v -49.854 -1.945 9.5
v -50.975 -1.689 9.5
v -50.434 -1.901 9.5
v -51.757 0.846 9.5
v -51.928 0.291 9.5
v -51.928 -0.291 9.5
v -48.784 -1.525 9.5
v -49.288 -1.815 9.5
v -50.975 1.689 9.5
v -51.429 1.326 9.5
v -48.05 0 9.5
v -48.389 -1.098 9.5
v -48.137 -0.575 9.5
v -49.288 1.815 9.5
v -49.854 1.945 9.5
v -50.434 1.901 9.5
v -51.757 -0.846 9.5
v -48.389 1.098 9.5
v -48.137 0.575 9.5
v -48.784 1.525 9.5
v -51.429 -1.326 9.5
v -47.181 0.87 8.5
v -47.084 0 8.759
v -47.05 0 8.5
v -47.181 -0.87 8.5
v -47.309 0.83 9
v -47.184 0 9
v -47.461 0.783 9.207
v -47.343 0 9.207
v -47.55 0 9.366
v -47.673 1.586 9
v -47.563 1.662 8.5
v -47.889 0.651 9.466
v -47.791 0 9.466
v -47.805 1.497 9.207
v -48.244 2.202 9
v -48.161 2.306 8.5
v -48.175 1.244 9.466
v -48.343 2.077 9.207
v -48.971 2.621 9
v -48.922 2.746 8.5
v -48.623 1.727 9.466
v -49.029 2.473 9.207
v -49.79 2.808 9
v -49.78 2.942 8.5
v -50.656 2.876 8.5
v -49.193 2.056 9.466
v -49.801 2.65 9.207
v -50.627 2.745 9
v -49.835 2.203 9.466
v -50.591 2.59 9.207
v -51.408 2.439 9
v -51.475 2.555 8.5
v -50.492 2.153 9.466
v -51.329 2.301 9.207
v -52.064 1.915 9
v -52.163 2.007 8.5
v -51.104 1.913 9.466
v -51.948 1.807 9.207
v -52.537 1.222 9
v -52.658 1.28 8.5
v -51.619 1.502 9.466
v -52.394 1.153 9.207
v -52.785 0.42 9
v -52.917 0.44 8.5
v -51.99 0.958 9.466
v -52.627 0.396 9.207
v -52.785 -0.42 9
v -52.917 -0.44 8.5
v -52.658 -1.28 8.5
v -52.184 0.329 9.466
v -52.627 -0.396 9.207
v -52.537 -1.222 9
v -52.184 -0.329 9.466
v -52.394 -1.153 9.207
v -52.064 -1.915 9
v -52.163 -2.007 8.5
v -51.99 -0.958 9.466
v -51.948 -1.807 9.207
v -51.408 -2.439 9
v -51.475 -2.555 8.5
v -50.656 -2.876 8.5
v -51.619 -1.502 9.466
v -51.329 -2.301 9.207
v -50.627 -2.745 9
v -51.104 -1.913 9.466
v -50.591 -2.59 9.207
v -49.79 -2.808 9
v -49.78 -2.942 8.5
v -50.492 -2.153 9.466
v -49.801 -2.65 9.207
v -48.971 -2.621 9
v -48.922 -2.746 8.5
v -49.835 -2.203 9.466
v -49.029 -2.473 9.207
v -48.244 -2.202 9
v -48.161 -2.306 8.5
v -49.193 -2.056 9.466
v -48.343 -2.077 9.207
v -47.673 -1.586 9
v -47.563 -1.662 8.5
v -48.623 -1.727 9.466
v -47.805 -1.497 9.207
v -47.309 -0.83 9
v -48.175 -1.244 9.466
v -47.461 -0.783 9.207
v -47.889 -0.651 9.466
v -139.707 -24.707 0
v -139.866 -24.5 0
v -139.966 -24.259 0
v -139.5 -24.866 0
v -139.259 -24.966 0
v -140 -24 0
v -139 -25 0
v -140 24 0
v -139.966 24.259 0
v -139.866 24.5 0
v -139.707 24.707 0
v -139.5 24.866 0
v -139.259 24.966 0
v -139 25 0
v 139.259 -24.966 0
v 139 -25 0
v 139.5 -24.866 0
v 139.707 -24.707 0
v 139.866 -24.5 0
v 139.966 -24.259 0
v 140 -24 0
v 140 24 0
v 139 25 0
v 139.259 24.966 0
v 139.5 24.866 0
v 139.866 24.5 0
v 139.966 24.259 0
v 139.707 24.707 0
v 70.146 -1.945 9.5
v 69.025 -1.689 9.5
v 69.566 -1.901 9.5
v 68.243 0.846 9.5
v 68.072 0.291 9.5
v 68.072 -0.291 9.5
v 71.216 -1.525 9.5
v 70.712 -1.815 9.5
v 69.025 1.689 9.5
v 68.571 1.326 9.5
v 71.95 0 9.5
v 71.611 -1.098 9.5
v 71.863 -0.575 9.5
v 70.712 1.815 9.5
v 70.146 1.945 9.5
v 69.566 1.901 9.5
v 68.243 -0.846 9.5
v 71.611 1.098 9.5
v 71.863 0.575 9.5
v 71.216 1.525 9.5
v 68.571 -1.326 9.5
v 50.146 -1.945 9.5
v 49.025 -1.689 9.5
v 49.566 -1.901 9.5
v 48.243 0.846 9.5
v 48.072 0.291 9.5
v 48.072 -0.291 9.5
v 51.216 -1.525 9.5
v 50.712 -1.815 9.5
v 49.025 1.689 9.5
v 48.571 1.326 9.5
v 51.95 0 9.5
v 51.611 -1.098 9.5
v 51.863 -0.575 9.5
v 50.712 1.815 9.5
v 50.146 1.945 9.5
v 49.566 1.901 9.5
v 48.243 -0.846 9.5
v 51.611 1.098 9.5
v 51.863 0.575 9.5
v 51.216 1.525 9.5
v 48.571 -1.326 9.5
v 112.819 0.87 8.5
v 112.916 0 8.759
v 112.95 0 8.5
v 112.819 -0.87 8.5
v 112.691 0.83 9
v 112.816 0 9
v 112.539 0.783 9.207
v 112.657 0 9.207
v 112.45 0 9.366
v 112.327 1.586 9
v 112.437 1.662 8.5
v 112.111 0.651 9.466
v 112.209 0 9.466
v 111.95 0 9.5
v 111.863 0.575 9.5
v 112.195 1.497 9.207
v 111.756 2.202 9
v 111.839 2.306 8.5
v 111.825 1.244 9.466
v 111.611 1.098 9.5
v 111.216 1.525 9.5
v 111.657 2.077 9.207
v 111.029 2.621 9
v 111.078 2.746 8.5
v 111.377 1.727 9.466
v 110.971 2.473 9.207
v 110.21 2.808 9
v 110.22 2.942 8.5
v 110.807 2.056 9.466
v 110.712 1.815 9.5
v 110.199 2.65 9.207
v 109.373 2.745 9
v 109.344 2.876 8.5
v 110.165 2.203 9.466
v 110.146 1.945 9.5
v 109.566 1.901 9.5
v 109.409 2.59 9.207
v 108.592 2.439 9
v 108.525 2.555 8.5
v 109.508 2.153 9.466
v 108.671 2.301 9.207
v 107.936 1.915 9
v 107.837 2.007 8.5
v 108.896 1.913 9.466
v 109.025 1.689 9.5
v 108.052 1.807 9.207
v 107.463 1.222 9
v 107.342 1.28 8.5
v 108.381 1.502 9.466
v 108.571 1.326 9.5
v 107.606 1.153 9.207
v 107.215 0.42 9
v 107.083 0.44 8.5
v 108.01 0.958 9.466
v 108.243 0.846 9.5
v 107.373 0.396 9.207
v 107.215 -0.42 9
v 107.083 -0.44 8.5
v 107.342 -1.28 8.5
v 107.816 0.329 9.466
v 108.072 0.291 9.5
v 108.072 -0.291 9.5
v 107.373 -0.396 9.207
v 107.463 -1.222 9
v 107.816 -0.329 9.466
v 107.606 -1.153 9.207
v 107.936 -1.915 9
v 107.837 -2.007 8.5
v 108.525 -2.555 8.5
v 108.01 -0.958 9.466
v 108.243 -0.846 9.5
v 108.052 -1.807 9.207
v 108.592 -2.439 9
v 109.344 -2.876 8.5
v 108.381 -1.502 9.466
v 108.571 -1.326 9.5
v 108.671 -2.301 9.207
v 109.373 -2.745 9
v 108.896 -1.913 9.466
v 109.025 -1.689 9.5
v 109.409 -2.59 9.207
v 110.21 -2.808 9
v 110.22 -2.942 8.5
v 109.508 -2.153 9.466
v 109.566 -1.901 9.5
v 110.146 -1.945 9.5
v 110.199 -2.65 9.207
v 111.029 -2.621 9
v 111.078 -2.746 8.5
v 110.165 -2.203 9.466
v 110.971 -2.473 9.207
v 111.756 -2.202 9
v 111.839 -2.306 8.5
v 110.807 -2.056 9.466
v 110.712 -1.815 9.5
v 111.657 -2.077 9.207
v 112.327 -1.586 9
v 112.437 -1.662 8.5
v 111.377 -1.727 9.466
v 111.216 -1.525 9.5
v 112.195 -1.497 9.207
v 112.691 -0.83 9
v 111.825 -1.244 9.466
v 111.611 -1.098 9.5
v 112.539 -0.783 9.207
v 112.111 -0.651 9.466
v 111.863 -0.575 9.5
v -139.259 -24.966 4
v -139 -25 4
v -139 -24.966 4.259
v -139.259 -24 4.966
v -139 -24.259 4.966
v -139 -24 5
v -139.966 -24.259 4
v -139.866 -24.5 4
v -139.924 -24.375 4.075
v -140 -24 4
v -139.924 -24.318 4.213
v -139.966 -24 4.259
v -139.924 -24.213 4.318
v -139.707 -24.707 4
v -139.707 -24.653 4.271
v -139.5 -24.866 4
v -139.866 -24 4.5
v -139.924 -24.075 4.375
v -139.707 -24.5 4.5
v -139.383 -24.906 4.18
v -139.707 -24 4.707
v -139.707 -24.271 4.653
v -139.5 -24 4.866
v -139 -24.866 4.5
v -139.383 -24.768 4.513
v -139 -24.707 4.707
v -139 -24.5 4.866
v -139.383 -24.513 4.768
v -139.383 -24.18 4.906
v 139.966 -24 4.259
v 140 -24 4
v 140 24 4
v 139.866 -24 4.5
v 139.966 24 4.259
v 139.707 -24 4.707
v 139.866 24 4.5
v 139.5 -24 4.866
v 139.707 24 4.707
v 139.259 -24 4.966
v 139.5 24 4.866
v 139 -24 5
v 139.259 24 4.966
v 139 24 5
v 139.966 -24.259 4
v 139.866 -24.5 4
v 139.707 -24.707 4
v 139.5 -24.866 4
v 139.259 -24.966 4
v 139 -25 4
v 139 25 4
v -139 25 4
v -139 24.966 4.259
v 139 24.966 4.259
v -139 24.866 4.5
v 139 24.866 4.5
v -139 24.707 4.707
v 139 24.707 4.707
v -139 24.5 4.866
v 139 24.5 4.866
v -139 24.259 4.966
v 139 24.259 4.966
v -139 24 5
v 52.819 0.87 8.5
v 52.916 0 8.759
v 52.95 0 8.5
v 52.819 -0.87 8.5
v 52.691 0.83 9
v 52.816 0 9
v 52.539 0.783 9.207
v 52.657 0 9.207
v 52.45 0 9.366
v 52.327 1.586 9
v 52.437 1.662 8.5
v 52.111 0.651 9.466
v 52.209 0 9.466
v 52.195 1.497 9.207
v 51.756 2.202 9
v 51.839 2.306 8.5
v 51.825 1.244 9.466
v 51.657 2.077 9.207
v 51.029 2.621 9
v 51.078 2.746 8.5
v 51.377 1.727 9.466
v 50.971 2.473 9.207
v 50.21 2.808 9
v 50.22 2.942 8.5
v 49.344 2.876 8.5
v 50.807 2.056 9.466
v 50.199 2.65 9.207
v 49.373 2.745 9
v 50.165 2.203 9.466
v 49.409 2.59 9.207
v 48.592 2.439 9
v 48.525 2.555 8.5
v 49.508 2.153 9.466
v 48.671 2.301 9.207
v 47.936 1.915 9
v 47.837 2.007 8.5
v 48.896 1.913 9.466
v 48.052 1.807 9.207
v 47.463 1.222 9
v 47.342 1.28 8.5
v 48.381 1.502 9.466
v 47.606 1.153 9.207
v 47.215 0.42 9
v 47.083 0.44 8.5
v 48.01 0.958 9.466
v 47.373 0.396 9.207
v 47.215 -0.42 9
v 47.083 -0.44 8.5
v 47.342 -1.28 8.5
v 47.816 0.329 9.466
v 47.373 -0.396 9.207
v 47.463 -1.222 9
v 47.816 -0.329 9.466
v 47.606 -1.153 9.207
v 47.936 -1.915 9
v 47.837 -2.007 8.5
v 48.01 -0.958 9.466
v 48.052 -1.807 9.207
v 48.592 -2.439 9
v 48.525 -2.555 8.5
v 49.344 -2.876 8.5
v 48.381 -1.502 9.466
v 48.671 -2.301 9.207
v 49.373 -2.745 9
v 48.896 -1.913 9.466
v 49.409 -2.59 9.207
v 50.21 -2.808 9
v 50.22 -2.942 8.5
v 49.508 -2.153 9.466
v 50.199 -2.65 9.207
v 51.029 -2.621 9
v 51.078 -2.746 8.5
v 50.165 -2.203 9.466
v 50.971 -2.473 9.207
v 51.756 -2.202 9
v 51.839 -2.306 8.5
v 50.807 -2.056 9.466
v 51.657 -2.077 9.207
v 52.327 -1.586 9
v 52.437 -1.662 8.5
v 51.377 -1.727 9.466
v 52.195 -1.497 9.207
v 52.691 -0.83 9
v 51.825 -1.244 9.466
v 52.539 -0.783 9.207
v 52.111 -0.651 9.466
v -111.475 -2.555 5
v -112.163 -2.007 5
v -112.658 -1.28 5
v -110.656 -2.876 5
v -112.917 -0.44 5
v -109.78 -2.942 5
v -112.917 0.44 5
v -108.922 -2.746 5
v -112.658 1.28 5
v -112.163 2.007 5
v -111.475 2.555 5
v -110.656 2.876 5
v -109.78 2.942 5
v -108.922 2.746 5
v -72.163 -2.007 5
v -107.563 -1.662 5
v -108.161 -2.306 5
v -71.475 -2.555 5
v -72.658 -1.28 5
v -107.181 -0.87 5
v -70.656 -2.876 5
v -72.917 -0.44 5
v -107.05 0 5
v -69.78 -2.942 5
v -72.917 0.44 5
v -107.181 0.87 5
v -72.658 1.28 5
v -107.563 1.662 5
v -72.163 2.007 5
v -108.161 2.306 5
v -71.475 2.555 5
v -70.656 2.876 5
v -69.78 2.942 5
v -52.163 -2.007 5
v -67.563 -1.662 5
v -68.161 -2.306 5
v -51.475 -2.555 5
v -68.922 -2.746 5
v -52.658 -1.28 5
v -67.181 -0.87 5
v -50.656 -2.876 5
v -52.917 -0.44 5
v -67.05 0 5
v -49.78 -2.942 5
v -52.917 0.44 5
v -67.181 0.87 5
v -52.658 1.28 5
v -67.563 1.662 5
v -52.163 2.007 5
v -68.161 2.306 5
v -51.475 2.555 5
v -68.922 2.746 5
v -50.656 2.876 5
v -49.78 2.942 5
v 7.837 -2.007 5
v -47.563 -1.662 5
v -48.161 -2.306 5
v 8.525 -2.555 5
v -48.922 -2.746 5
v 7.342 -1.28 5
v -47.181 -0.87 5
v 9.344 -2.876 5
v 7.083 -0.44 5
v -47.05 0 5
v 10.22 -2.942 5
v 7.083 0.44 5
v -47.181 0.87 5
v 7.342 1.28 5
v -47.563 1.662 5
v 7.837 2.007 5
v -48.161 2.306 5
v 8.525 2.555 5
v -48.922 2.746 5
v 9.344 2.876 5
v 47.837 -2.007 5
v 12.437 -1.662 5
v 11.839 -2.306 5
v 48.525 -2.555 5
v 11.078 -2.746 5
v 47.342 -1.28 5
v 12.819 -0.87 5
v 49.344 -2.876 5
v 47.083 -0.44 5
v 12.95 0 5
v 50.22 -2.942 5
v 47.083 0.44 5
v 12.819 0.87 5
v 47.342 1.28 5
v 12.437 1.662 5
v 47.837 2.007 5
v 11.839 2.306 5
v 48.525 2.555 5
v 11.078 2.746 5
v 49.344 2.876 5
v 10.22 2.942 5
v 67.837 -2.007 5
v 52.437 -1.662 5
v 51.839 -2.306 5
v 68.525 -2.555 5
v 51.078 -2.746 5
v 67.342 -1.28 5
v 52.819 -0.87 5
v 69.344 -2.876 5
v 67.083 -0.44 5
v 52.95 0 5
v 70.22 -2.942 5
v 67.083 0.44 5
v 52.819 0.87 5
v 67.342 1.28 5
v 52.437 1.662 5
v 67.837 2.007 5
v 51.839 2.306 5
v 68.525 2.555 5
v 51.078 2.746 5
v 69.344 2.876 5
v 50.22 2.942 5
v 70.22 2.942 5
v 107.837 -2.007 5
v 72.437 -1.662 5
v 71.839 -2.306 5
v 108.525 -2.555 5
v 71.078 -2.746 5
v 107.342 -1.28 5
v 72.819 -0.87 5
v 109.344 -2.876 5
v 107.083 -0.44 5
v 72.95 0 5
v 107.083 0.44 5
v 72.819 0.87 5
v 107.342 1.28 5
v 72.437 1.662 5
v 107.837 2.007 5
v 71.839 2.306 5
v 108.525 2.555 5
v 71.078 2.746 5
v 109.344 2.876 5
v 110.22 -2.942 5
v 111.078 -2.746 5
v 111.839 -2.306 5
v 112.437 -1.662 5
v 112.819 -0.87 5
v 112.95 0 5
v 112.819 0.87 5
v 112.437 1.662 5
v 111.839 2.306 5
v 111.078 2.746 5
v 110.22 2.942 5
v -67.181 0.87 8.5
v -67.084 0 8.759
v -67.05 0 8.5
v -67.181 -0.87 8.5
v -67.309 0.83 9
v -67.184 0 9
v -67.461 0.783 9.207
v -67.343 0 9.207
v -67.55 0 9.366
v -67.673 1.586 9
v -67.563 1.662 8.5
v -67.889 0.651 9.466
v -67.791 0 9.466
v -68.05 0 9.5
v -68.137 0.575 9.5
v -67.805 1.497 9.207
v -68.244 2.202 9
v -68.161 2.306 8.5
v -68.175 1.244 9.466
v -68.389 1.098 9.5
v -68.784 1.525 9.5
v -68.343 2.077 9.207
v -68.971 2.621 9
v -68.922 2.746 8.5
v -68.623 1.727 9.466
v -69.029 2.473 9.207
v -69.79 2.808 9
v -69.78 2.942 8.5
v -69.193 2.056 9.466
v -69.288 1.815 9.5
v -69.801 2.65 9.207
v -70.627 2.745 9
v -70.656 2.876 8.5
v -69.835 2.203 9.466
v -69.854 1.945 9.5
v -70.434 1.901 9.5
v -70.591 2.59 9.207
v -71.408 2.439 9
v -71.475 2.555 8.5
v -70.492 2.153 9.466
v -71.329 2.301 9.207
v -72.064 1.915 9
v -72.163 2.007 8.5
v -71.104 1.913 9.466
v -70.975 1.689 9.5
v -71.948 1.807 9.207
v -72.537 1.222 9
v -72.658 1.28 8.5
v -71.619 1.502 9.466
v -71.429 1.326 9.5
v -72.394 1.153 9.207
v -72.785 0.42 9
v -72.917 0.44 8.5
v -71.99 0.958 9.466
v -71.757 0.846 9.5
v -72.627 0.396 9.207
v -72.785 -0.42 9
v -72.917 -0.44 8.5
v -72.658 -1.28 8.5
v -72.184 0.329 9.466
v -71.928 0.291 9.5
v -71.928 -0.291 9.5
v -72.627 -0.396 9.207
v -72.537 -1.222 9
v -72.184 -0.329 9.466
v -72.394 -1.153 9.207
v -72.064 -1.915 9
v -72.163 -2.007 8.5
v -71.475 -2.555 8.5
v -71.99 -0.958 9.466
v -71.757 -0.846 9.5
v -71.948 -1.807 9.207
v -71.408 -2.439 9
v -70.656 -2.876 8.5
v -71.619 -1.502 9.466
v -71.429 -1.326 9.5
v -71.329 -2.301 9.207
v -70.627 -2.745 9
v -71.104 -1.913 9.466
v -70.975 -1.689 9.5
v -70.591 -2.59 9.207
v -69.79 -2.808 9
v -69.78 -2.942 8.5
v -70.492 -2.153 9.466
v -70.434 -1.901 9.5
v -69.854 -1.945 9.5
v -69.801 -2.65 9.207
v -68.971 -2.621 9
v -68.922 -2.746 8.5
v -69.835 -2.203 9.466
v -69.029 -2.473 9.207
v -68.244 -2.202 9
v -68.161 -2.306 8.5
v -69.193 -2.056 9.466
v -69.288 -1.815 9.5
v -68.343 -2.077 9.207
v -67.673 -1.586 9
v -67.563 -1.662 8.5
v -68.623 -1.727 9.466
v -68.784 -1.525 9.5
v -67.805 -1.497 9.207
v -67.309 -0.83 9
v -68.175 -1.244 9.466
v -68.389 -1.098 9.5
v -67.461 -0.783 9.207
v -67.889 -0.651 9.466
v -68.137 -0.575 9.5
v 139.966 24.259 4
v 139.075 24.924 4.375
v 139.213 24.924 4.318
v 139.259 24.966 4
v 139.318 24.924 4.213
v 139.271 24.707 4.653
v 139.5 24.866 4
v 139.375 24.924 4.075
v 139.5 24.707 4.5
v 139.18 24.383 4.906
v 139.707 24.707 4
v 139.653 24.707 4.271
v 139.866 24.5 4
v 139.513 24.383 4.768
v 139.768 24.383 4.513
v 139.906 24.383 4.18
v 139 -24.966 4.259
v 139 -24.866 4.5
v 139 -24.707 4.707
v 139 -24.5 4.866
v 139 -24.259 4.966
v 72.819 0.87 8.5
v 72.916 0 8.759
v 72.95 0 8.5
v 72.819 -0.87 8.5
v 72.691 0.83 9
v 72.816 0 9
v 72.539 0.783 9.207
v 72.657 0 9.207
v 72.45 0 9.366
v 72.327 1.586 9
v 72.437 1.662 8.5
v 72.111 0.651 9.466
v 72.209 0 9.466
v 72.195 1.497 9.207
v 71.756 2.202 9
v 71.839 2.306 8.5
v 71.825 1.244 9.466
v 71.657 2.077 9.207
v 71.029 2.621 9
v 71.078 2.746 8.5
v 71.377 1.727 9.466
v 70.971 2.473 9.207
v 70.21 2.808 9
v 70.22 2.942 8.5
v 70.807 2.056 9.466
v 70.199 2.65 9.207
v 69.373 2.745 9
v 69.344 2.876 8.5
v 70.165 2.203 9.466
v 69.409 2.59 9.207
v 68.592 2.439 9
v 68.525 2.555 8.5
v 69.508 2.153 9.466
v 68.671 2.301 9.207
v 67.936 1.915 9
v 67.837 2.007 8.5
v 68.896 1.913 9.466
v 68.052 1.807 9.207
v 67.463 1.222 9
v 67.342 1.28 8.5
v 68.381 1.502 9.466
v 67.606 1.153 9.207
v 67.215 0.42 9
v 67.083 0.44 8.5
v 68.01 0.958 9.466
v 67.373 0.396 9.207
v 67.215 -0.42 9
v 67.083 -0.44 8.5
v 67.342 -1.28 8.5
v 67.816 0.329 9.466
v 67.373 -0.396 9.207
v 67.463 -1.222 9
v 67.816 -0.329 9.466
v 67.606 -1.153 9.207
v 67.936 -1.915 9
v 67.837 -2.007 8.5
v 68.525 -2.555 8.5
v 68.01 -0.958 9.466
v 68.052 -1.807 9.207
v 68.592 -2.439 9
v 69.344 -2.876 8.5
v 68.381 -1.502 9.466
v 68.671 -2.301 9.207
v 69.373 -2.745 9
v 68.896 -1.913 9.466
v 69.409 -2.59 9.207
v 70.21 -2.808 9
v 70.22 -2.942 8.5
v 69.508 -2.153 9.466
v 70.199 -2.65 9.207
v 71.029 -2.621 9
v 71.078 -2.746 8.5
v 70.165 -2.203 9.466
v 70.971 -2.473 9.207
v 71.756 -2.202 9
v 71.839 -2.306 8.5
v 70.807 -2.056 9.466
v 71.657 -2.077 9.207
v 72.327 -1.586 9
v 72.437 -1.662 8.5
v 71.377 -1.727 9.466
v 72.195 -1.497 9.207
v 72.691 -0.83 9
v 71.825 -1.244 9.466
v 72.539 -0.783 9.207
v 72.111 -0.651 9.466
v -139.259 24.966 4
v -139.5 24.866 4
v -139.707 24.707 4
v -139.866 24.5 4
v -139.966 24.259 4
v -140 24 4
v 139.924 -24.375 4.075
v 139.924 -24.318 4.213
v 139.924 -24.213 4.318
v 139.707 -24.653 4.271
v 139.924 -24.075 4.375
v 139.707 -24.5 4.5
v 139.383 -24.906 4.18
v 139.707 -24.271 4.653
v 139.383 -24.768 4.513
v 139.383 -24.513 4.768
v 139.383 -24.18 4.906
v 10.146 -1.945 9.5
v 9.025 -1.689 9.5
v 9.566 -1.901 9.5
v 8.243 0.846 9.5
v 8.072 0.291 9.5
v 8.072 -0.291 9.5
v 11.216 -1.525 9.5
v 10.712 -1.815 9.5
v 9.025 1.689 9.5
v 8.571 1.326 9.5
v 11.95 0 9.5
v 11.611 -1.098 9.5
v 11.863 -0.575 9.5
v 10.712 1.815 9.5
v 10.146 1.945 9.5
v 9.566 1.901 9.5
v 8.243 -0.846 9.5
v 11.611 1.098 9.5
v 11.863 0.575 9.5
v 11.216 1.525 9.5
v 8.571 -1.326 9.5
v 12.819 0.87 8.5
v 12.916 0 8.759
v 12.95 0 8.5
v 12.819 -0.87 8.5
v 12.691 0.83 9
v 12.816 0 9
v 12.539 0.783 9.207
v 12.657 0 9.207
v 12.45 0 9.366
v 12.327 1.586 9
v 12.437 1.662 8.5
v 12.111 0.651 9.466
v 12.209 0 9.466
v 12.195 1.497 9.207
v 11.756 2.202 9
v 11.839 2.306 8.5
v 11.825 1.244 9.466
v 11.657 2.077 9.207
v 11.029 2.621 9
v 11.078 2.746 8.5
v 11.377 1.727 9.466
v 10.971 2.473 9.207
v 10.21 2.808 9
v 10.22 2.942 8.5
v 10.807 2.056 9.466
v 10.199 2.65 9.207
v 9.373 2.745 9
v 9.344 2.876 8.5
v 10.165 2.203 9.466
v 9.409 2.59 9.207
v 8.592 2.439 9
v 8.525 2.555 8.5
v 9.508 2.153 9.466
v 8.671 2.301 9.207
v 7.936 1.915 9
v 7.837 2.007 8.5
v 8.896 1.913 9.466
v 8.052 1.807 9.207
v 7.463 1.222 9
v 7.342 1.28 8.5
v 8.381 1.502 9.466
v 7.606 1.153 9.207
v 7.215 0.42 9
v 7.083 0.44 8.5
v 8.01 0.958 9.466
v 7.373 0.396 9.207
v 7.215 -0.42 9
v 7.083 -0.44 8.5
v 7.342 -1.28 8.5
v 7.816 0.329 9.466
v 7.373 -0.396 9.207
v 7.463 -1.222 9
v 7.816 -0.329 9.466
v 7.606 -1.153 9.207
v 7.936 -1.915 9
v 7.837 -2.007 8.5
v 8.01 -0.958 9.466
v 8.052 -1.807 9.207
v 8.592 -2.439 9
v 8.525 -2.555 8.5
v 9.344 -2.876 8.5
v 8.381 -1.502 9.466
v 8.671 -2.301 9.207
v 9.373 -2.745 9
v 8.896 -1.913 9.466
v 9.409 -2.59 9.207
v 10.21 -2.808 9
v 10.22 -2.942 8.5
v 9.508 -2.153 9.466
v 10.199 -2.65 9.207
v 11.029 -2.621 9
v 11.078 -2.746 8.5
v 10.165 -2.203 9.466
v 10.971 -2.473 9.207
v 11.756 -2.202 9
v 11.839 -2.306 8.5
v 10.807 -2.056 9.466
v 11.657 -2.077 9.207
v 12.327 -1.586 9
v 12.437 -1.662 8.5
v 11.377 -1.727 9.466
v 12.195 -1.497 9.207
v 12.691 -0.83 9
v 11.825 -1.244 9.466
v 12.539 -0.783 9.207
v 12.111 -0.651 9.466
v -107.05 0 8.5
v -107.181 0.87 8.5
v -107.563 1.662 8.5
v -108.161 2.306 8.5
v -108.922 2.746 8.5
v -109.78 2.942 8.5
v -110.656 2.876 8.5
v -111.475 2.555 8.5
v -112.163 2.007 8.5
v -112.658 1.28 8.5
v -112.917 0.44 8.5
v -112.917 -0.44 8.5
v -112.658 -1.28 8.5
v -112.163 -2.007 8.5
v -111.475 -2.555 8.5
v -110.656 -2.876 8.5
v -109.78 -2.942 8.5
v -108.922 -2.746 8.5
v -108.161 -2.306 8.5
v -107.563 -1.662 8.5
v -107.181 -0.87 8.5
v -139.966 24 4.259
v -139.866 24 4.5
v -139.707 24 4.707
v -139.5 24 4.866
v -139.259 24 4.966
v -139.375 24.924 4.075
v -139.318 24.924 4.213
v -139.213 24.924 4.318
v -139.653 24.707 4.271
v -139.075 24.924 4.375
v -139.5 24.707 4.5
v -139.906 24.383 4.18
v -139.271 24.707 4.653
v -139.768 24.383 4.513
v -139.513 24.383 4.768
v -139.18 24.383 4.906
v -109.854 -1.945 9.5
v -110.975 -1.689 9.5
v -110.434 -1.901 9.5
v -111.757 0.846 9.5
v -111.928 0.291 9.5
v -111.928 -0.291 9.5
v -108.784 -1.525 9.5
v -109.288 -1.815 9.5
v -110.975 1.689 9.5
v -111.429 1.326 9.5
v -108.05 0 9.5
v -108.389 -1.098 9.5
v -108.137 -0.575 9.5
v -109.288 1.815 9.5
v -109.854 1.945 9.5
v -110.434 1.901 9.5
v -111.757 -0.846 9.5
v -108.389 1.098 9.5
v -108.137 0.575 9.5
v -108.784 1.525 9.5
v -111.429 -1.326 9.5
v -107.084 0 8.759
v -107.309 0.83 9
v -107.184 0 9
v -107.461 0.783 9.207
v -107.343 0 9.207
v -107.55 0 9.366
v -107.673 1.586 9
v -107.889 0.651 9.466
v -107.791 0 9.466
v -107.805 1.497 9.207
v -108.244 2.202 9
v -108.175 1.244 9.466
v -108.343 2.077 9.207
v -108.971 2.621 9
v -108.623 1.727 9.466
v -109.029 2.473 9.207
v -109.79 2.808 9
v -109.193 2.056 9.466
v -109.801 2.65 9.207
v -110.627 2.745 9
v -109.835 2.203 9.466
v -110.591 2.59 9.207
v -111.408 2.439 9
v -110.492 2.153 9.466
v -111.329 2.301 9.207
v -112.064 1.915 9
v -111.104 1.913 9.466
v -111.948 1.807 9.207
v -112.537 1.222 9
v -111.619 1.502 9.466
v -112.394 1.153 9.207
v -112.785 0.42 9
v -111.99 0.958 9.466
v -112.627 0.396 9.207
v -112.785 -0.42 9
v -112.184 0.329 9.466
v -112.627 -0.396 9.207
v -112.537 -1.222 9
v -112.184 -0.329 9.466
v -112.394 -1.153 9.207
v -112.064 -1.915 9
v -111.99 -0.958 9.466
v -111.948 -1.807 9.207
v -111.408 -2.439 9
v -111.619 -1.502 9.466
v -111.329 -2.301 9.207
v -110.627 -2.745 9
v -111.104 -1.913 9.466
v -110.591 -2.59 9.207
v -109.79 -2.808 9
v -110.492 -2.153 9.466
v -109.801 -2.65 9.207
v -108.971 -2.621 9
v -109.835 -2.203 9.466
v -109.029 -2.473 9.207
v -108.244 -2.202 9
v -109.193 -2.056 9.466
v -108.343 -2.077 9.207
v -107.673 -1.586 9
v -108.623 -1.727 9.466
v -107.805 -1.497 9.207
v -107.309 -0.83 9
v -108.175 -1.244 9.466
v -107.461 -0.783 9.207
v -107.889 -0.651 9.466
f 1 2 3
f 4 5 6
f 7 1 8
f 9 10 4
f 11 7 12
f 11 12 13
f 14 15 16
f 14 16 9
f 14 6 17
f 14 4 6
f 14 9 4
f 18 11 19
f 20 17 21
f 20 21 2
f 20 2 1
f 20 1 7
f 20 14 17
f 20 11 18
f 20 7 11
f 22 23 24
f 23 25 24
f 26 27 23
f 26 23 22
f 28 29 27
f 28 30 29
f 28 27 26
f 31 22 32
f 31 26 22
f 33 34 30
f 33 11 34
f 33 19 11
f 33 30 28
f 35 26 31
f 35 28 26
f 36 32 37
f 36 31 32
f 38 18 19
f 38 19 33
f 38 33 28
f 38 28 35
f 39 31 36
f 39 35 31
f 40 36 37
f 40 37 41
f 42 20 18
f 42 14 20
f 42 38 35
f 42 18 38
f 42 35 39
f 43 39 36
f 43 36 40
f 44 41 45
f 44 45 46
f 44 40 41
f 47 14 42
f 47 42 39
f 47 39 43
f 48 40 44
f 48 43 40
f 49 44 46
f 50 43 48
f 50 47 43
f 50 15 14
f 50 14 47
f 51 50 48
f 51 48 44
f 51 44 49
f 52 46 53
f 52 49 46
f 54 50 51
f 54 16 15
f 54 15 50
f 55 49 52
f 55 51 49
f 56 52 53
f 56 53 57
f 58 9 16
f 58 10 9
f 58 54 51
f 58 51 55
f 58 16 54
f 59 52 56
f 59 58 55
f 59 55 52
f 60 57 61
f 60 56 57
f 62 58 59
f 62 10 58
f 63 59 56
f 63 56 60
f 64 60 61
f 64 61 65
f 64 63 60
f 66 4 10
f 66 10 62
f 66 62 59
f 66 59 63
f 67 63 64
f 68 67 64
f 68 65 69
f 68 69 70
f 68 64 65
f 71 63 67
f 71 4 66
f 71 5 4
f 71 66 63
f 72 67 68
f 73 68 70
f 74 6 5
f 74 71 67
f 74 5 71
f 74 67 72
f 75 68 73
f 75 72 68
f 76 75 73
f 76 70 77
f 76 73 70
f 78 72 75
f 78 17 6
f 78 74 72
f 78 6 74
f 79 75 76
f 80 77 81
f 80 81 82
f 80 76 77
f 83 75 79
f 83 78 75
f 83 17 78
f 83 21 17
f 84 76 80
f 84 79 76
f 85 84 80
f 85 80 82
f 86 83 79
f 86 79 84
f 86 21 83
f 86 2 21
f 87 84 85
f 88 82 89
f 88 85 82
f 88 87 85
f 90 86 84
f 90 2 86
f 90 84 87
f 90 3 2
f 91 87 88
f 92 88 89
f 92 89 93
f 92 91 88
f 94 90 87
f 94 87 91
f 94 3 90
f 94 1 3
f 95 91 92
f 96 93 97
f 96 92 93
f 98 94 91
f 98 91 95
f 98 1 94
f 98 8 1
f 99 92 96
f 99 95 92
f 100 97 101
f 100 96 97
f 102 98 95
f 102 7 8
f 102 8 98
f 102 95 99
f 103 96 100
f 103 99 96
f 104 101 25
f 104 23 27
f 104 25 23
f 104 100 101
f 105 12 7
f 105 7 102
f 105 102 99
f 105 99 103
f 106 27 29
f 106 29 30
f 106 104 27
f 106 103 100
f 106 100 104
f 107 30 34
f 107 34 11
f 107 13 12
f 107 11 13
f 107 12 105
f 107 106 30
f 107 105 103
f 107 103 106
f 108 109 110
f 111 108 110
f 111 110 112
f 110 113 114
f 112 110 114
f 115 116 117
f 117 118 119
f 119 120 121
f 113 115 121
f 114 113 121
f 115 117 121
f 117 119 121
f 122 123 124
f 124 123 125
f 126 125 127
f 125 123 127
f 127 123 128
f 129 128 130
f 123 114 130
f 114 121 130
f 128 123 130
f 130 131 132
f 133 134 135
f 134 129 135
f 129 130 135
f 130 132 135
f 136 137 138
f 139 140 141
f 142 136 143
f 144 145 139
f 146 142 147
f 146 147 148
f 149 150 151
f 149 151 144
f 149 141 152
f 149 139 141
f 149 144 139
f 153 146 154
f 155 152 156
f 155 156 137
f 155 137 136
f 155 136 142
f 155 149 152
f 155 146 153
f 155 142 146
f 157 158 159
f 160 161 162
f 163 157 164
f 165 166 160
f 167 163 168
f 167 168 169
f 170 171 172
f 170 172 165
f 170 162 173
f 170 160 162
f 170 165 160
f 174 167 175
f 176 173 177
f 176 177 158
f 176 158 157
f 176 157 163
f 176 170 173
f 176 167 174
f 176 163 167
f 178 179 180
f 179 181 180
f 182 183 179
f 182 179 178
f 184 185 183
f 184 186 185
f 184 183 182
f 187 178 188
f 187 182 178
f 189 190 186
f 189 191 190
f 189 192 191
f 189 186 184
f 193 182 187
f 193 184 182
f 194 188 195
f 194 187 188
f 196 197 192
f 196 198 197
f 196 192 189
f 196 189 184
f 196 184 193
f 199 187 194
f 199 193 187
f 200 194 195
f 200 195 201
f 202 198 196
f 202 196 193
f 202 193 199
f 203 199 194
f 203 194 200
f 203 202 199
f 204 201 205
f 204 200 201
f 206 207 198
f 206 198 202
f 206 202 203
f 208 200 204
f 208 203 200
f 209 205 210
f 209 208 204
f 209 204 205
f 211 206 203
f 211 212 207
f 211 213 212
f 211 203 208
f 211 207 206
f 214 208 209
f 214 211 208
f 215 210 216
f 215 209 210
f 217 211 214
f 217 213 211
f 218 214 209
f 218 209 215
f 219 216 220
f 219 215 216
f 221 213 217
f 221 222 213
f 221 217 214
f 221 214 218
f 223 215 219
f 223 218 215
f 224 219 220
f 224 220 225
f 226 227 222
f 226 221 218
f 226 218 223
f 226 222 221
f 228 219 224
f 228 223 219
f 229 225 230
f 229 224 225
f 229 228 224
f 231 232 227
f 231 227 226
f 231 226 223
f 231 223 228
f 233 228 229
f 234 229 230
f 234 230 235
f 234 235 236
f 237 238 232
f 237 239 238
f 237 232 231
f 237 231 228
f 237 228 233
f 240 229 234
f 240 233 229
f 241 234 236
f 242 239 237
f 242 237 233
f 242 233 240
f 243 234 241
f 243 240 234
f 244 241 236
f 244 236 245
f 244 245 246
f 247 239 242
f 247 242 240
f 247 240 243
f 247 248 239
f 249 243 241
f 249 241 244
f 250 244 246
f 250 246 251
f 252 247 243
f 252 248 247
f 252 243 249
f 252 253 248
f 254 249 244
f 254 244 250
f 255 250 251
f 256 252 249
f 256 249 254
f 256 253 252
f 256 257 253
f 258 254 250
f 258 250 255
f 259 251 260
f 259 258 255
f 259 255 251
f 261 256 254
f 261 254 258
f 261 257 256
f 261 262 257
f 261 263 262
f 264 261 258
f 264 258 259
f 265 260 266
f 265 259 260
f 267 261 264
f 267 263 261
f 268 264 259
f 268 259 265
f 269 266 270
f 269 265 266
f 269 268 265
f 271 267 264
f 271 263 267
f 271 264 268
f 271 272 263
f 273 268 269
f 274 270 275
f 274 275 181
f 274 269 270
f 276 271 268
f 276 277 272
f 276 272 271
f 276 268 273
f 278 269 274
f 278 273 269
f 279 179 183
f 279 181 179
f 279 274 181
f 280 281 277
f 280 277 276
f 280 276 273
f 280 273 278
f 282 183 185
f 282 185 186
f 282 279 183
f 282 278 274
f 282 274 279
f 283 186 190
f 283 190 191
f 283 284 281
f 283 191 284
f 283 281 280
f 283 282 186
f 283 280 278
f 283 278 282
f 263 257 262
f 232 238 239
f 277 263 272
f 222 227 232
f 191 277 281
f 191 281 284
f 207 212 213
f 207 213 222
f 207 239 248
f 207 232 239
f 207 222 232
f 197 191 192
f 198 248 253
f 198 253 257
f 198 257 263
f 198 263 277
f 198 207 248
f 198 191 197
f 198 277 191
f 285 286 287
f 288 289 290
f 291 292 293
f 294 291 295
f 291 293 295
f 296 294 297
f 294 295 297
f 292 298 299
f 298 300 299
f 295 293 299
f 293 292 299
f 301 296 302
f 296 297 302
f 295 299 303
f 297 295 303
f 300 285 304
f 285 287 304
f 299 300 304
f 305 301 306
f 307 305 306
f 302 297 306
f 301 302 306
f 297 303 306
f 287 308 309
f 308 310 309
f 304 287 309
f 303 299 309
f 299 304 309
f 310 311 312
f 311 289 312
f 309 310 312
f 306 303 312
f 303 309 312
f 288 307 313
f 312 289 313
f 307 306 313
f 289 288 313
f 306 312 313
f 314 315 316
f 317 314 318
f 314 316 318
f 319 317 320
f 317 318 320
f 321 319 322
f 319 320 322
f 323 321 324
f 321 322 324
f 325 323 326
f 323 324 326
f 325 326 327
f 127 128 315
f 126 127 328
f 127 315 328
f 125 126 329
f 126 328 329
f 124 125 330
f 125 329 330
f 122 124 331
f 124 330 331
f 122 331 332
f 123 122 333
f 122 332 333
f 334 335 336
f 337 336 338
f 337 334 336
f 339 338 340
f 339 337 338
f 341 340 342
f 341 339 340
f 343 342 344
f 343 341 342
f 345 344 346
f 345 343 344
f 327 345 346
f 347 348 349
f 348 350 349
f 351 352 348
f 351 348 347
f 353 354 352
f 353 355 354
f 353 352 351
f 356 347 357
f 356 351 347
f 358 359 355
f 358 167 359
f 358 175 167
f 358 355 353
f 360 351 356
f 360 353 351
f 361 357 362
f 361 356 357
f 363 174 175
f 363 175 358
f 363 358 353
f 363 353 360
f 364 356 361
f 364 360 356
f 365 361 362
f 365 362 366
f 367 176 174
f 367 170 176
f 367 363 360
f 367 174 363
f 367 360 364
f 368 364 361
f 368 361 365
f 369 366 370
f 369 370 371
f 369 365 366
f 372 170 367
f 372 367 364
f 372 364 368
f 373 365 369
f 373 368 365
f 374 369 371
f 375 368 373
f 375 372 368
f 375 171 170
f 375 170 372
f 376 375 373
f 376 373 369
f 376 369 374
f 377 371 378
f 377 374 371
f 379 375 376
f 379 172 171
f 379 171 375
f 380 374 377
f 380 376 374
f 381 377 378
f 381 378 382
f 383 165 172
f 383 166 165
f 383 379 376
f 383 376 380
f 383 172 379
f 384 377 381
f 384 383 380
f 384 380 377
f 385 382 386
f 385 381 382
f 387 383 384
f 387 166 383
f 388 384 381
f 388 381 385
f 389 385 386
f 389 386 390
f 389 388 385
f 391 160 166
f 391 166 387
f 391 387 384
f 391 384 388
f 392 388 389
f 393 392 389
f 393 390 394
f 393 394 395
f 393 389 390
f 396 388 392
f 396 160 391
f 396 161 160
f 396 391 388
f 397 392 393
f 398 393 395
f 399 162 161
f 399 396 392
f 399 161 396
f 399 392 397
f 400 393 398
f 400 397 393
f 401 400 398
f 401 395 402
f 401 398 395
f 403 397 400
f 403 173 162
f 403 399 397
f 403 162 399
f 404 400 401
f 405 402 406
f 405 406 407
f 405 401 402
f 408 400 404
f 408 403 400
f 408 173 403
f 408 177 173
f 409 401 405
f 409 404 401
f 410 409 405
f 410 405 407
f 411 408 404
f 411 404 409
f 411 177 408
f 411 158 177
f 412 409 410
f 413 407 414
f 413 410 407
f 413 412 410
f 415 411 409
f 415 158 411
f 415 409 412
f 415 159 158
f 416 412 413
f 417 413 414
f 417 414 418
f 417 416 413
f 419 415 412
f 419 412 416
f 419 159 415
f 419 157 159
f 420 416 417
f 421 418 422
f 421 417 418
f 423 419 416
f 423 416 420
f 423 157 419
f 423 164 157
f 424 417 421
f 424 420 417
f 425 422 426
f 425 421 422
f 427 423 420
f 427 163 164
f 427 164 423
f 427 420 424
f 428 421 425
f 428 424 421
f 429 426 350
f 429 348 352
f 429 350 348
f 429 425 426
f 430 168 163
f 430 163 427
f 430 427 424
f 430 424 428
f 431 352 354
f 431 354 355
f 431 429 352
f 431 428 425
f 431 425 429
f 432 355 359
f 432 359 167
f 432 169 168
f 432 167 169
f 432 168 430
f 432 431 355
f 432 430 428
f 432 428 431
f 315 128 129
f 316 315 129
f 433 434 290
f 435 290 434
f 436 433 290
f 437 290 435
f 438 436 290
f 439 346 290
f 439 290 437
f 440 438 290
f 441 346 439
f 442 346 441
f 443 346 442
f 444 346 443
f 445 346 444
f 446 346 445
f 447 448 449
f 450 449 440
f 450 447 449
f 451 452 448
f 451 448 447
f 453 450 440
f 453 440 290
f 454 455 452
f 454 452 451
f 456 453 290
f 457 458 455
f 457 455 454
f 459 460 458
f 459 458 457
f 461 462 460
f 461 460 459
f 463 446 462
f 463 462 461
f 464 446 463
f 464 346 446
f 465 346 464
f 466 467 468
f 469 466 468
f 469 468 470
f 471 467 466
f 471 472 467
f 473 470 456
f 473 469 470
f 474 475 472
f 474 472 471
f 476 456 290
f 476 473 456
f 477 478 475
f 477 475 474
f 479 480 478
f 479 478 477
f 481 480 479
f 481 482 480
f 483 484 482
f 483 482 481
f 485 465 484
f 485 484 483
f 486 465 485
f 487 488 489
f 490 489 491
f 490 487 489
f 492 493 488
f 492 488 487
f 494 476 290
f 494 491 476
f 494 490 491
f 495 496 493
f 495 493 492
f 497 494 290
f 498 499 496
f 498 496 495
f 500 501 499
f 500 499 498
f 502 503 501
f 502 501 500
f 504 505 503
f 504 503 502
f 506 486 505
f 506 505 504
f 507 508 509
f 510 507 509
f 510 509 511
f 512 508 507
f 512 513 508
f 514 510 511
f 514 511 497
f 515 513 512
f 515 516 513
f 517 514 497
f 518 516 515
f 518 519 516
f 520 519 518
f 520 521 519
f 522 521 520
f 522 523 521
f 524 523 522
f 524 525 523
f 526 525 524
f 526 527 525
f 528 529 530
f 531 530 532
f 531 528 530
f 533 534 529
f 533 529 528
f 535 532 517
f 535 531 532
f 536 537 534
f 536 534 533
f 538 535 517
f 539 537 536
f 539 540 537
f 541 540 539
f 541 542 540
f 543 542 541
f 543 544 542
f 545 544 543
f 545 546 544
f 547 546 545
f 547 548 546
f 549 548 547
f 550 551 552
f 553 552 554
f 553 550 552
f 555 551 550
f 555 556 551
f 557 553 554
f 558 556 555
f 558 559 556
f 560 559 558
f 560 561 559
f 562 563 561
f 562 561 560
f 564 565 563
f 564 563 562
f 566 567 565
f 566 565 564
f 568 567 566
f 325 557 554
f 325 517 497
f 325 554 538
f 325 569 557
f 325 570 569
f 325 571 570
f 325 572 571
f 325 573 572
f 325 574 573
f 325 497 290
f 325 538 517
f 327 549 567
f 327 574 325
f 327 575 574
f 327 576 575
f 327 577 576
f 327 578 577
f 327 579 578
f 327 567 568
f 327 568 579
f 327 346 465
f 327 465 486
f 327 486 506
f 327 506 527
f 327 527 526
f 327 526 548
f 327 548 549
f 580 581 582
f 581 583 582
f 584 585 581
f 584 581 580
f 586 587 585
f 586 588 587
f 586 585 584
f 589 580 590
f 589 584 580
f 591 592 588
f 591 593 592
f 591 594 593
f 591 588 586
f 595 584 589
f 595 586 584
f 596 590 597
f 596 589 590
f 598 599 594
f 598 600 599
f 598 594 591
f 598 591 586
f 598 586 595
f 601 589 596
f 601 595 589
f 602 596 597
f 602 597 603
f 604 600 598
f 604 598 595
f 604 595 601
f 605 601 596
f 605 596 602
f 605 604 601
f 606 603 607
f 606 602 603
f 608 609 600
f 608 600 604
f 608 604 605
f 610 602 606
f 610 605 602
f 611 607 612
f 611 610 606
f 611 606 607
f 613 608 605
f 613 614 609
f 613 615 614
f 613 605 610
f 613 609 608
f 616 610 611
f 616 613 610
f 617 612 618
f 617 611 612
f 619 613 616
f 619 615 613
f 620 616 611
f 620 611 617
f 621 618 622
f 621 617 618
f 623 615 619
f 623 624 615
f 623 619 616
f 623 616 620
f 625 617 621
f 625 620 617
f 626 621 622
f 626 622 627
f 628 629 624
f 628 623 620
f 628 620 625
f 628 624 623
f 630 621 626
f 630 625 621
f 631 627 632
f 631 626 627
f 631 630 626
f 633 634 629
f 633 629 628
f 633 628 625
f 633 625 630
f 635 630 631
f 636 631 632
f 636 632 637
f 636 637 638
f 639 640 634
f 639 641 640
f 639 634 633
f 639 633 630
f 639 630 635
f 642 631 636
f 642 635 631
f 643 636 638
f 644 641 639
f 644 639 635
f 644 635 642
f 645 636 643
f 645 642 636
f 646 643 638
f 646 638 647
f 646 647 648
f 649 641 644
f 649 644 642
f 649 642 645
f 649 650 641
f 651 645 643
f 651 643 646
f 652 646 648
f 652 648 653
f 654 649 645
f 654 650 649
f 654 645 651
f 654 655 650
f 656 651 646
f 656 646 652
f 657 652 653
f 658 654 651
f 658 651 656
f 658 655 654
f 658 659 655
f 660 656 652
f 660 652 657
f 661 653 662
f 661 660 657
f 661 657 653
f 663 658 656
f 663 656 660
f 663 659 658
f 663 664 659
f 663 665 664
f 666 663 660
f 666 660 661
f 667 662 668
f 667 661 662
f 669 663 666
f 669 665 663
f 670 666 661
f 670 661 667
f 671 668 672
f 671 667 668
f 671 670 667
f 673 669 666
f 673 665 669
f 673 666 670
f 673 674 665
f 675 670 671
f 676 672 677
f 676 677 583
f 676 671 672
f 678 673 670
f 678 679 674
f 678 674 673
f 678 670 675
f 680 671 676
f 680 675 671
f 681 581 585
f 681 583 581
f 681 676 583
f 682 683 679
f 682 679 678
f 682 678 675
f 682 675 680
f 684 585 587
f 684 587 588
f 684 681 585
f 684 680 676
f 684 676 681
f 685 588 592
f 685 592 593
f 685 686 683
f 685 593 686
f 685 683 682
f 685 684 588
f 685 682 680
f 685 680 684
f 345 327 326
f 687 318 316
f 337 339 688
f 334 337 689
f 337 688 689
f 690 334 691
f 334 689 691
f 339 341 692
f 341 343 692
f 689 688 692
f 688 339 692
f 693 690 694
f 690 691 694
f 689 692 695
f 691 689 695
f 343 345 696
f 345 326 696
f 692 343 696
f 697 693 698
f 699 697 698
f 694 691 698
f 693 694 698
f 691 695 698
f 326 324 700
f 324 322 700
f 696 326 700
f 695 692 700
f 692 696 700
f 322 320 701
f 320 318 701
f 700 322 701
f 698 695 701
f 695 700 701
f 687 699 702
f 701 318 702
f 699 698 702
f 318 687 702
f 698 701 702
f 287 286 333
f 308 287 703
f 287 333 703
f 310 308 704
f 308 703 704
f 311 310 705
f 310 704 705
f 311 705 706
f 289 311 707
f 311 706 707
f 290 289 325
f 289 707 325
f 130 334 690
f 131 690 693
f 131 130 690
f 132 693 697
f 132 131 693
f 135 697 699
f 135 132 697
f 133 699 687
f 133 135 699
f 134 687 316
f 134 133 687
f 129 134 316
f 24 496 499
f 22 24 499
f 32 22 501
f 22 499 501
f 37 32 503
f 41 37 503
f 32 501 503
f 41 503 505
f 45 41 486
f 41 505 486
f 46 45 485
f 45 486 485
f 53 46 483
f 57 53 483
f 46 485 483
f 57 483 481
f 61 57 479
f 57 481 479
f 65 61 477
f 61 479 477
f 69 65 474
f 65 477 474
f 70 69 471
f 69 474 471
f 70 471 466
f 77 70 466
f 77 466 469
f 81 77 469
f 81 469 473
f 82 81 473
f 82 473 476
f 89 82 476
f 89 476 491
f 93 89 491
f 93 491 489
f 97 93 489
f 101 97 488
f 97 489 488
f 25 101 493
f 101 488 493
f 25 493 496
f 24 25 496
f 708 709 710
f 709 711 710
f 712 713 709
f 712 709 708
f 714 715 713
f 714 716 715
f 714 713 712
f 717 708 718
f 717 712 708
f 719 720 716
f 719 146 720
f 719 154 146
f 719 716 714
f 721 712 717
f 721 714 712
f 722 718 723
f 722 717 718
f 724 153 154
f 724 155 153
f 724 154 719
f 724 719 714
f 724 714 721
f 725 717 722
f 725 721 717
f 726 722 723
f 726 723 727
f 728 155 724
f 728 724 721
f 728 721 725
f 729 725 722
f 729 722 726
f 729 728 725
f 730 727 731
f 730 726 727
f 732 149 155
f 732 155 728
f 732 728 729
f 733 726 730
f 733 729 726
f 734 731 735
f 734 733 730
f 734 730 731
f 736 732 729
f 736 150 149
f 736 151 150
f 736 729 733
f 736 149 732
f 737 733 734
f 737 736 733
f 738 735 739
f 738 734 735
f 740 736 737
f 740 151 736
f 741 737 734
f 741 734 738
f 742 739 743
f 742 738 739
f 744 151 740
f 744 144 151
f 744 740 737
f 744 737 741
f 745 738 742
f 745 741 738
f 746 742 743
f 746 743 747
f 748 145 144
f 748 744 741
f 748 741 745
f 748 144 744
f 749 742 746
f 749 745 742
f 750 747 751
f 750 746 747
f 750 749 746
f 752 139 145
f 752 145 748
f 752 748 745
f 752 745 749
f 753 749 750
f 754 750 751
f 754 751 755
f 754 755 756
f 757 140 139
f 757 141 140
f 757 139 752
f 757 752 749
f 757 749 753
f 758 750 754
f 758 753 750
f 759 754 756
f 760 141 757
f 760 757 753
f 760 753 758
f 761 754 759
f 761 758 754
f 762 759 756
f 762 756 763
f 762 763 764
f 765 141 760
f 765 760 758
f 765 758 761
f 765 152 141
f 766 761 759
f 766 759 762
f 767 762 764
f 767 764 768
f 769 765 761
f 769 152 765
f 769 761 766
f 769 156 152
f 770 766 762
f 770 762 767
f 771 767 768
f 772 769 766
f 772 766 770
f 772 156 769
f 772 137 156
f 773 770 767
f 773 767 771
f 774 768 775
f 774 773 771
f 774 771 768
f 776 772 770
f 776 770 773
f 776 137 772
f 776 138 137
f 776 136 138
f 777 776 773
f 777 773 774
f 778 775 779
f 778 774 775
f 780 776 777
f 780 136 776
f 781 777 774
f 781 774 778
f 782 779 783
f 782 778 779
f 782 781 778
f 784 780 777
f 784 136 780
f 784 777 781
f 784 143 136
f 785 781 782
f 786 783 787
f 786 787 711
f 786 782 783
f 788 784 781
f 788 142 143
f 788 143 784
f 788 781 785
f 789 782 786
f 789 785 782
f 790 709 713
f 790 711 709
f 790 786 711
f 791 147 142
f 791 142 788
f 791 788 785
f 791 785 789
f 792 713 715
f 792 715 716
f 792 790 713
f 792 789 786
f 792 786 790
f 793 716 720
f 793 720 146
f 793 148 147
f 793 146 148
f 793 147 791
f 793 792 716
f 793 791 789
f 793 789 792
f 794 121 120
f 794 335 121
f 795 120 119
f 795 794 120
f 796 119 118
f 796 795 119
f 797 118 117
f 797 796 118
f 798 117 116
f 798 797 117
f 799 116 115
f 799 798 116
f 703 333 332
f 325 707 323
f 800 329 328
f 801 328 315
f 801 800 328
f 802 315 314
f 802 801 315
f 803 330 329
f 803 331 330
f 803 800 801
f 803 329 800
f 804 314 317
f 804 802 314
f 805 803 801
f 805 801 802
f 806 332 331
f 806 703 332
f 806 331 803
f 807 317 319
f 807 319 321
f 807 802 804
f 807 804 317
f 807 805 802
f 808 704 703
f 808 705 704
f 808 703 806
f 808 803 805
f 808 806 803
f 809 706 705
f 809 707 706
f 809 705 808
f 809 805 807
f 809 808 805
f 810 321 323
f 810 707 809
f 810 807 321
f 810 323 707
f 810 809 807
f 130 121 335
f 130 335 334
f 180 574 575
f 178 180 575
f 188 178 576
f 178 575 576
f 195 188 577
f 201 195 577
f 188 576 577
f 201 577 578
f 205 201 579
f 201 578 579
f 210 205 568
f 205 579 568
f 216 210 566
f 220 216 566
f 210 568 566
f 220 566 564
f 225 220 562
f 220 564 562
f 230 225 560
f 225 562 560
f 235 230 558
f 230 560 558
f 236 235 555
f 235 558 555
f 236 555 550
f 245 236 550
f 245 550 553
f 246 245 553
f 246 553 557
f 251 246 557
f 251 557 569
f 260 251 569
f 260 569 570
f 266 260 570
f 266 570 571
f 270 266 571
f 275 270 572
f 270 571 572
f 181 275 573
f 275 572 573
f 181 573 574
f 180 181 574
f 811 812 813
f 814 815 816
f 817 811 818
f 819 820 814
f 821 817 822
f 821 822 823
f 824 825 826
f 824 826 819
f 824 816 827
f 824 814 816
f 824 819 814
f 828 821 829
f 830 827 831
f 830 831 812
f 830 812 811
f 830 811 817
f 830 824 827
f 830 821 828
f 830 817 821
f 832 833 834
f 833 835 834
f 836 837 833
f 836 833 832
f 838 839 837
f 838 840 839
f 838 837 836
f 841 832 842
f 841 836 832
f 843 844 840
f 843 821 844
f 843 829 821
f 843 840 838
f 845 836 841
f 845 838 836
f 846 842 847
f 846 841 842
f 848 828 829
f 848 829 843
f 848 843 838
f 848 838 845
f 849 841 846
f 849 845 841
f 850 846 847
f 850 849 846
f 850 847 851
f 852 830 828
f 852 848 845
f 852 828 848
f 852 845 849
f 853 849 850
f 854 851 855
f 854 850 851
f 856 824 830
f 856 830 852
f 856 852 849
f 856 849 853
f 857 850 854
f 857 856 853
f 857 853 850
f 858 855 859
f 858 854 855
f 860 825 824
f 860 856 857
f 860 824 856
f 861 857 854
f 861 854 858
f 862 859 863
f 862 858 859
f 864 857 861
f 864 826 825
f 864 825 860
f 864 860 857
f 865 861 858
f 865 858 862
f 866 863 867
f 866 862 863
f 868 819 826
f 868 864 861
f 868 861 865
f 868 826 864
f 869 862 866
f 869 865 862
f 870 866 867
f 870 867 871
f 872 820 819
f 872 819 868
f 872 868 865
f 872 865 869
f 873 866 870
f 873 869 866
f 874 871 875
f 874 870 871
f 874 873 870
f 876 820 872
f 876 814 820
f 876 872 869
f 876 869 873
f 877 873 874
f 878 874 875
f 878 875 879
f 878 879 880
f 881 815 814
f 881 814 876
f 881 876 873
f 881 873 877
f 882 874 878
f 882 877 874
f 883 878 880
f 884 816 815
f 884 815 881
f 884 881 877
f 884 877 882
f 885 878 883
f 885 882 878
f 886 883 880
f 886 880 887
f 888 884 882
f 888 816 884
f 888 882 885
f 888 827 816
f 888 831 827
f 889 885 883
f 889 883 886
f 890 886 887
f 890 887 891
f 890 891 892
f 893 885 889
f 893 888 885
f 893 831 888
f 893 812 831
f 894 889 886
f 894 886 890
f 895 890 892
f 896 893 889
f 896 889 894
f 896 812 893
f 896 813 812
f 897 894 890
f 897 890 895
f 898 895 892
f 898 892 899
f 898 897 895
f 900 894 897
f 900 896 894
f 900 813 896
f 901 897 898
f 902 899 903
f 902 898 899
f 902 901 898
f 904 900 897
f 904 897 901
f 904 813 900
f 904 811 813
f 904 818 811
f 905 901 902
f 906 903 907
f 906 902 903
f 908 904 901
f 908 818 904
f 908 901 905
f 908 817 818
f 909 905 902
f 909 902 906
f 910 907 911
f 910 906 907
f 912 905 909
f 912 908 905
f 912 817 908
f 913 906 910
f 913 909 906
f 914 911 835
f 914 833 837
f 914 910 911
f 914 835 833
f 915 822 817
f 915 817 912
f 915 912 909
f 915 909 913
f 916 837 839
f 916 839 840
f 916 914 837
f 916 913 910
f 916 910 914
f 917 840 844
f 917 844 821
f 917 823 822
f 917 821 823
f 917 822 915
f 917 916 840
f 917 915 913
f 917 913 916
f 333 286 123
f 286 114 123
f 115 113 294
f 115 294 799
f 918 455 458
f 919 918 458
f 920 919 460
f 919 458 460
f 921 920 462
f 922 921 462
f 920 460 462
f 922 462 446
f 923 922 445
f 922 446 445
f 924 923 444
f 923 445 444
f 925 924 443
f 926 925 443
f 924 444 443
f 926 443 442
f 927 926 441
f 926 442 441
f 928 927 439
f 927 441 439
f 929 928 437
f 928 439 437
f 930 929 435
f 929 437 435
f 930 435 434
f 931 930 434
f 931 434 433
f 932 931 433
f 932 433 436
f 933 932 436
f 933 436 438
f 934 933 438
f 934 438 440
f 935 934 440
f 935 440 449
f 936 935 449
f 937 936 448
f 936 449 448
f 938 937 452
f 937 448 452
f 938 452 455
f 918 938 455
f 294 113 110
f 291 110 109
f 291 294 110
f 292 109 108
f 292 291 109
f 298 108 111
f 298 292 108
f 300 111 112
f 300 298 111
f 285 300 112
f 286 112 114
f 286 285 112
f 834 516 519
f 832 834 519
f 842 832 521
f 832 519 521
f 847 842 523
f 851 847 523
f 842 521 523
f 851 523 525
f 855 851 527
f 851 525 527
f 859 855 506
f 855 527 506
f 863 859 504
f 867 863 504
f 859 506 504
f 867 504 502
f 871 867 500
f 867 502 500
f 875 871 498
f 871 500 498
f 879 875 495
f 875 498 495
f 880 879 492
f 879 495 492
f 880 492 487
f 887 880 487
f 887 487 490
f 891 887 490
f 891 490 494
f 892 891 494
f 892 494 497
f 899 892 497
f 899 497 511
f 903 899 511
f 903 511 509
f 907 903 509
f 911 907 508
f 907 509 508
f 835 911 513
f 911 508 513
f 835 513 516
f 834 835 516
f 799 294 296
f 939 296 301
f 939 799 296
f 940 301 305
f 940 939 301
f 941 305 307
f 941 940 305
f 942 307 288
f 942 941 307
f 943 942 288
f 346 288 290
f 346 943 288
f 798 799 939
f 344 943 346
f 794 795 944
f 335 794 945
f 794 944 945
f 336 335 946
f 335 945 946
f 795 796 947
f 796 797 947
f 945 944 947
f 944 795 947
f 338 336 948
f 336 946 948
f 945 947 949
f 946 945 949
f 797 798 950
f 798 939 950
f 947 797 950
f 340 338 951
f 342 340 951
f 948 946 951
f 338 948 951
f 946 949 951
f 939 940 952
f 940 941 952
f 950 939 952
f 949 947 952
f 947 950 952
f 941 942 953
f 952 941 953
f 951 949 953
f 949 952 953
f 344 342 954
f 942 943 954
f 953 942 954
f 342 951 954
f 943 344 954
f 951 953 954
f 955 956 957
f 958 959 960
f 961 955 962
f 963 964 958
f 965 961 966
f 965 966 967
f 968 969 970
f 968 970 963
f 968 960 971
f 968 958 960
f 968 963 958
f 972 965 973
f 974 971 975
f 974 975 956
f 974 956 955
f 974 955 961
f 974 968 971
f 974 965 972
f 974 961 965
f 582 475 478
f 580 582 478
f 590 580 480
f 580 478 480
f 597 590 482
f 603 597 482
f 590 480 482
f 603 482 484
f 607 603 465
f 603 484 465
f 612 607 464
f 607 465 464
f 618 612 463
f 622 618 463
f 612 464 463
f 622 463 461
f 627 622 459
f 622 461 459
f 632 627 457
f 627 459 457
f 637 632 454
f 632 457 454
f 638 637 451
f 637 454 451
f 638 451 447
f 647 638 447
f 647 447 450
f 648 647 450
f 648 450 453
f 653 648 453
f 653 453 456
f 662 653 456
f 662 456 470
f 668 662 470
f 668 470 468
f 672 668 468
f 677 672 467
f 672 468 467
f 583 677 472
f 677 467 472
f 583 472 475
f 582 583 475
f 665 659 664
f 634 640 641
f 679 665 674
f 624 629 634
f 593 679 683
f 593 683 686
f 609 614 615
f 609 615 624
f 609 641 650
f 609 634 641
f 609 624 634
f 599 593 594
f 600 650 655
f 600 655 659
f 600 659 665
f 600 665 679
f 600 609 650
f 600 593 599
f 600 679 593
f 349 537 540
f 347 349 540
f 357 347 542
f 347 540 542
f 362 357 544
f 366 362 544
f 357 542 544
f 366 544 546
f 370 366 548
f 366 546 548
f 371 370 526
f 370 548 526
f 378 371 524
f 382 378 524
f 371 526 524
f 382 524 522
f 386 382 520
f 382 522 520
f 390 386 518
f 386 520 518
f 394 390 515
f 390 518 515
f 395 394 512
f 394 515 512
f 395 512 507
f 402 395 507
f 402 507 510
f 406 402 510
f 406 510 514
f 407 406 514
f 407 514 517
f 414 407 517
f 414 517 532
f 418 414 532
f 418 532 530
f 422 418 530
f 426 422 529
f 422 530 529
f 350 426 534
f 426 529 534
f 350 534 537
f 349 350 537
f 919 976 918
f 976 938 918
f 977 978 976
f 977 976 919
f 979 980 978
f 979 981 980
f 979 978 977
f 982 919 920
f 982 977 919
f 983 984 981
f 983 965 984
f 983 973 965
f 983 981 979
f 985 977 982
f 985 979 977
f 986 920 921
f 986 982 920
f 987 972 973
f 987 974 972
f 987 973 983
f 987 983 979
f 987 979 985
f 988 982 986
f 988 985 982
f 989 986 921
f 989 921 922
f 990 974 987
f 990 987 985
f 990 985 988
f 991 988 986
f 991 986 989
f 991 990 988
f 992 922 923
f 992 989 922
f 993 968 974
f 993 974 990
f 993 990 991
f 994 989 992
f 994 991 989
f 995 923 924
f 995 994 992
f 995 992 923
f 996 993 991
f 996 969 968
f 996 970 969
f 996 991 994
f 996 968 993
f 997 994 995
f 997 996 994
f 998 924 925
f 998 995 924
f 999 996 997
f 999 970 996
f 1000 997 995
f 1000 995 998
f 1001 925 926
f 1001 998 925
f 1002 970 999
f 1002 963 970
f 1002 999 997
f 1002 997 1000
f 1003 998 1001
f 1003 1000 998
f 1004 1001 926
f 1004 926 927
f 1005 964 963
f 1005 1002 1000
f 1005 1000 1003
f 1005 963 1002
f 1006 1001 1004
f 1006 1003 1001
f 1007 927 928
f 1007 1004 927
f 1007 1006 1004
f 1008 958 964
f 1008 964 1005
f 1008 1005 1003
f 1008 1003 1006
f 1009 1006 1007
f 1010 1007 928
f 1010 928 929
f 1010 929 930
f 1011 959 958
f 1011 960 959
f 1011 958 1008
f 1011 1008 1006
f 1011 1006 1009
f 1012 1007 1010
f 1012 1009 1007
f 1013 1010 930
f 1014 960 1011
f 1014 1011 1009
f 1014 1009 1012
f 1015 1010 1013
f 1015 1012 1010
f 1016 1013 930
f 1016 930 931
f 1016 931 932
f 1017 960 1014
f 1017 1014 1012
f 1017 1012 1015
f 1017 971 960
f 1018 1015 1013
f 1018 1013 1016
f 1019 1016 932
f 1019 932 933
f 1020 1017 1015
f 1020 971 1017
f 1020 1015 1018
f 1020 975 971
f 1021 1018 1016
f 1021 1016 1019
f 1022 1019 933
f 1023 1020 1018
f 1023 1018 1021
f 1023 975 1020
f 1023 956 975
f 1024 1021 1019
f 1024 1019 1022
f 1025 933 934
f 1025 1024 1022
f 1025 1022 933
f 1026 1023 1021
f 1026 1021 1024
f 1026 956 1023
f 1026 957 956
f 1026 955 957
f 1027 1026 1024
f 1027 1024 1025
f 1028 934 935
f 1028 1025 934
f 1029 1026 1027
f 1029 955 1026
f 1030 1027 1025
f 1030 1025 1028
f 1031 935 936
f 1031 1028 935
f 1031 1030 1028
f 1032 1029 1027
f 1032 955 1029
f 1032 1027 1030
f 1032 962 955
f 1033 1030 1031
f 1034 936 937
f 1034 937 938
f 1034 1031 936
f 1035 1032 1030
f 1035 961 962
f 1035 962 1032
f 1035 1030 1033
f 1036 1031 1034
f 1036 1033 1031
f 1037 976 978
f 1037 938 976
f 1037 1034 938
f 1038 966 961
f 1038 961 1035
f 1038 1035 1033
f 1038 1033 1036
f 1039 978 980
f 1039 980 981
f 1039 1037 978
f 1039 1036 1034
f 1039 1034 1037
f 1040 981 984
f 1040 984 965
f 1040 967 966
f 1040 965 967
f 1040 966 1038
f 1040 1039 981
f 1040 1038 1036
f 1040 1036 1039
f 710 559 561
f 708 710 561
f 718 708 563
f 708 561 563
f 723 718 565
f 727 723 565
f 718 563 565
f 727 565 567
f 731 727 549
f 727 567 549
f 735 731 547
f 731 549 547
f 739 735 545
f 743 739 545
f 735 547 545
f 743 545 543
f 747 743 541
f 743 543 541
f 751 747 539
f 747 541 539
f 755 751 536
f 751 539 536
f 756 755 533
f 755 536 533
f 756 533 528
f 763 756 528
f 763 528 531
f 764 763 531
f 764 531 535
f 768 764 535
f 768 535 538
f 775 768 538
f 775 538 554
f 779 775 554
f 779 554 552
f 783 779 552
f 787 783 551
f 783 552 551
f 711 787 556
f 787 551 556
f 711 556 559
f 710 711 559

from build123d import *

# Parameters (mm, degrees)
SKETCH_W     = 280
SKETCH_H     = 50
PAD_DEPTH    = 5
FILLET_R     = 1
FILLET001_R  = 1
FILLET002_R  = 1
FILLET003_R  = 1
SKETCH001_R  = 2.95
PAD001_DEPTH = 4.5
FILLET004_R  = 1
FILLET005_R  = 1
FILLET006_R  = 1
FILLET007_R  = 1
FILLET008_R  = 1
FILLET009_R  = 1
FILLET010_R  = 1


with BuildPart() as part:
    # Sketch → Pad (new body)
    with BuildSketch(Plane.XY):
        Rectangle(SKETCH_W, SKETCH_H)
    extrude(amount=PAD_DEPTH)

    # Fillet
    fillet_edges = [part.edges().sort_by_distance(p)[0] for p in [
        (0, -25, 5),
    ]]
    fillet(fillet_edges, radius=FILLET_R)

    # Fillet001
    fillet001_edges = [part.edges().sort_by_distance(p)[0] for p in [
        (-140, 0.5, 5),
    ]]
    fillet(fillet001_edges, radius=FILLET001_R)

    # Fillet002
    fillet002_edges = [part.edges().sort_by_distance(p)[0] for p in [
        (140, 0.5, 5),
    ]]
    fillet(fillet002_edges, radius=FILLET002_R)

    # Fillet003
    fillet003_edges = [part.edges().sort_by_distance(p)[0] for p in [
        (0, 25, 5),
    ]]
    fillet(fillet003_edges, radius=FILLET003_R)

    # Sketch001 (on Face18 of Fillet003) → Pad001 (join)
    with BuildSketch(Plane.XY.offset(5)):
        with Locations((10, 0)):
            Circle(SKETCH001_R)
        with Locations((50, 0)):
            Circle(SKETCH001_R)
        with Locations((110, 0)):
            Circle(SKETCH001_R)
        with Locations((70, 0)):
            Circle(SKETCH001_R)
        with Locations((-50, 0)):
            Circle(SKETCH001_R)
        with Locations((-70, 0)):
            Circle(SKETCH001_R)
        with Locations((-110, 0)):
            Circle(SKETCH001_R)
    extrude(amount=PAD001_DEPTH)

    # Fillet004
    fillet004_edges = [part.edges().sort_by_distance(p)[0] for p in [
        (-112.95, 0, 9.5),
    ]]
    fillet(fillet004_edges, radius=FILLET004_R)

    # Fillet005
    fillet005_edges = [part.edges().sort_by_distance(p)[0] for p in [
        (-72.95, 0, 9.5),
    ]]
    fillet(fillet005_edges, radius=FILLET005_R)

    # Fillet006
    fillet006_edges = [part.edges().sort_by_distance(p)[0] for p in [
        (-52.95, 0, 9.5),
    ]]
    fillet(fillet006_edges, radius=FILLET006_R)

    # Fillet007
    fillet007_edges = [part.edges().sort_by_distance(p)[0] for p in [
        (7.05, 0, 9.5),
    ]]
    fillet(fillet007_edges, radius=FILLET007_R)

    # Fillet008
    fillet008_edges = [part.edges().sort_by_distance(p)[0] for p in [
        (47.05, 0, 9.5),
    ]]
    fillet(fillet008_edges, radius=FILLET008_R)

    # Fillet009
    fillet009_edges = [part.edges().sort_by_distance(p)[0] for p in [
        (67.05, 0, 9.5),
    ]]
    fillet(fillet009_edges, radius=FILLET009_R)

    # Fillet010
    fillet010_edges = [part.edges().sort_by_distance(p)[0] for p in [
        (107.05, 0, 9.5),
    ]]
    fillet(fillet010_edges, radius=FILLET010_R)


solid = part.part
